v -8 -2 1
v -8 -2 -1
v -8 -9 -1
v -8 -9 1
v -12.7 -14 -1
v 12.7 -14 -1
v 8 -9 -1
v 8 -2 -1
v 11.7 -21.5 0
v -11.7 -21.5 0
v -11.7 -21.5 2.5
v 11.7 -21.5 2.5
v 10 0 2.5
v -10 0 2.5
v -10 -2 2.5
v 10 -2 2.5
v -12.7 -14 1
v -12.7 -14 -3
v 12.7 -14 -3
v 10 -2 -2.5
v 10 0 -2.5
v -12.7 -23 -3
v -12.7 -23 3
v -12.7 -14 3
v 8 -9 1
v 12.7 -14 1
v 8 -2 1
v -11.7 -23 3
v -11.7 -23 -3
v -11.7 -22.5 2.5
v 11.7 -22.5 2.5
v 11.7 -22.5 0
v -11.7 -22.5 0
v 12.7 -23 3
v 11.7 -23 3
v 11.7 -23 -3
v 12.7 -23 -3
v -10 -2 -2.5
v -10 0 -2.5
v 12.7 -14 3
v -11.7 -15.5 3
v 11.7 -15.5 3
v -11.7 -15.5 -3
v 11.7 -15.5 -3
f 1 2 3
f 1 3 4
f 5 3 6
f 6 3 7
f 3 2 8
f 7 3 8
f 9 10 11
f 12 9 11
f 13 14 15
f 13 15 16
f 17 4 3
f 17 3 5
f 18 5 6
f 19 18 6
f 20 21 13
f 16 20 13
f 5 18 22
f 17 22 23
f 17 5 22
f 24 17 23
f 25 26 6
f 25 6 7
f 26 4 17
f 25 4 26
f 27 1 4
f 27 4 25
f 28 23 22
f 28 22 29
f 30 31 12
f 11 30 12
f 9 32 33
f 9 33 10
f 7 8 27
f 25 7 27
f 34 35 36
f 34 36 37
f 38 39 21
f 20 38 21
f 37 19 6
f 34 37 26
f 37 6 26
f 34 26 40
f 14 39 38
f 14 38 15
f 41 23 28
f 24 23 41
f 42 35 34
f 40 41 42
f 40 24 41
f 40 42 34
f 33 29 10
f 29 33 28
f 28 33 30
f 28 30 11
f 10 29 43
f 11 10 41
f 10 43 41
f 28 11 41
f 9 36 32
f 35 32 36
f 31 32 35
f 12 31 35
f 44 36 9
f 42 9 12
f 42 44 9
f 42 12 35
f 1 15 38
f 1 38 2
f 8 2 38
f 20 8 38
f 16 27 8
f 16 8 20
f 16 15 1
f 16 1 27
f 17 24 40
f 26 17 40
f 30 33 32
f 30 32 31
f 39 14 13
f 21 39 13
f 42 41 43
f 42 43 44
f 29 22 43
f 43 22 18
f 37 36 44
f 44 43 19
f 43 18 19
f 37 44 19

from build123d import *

# Parameters (mm, degrees)
F0_W      = 20
F0_H      = 5
F1_DEPTH  = 2
F2_W      = 16
F2_H      = 2
F3_DEPTH  = 7
F5_DEPTH  = 2
F6_W      = 25.4
F6_H      = 6
F7_DEPTH  = 1.5
F8_W      = 1
F8_H      = 6
F9_DEPTH  = 7.5
F10_W     = 1
F10_H     = 2.5
F11_DEPTH = 23.4


with BuildPart() as f1:
    # F0 (on Front) → F1 (new body)
    with BuildSketch(Plane.XZ):
        Rectangle(F0_W, F0_H)
    extrude(amount=F1_DEPTH)

    # F2 (on face) → F3 (join)
    with BuildSketch(Plane.XZ.offset(2)):
        Rectangle(F2_W, F2_H)
    extrude(amount=F3_DEPTH)

    # F4 (on face) → F5 (join, through all)
    with BuildSketch(Plane.XY.offset(1)):
        Polygon((12.7, -14), (8, -9), (-8, -9), (-12.7, -14), align=None)
    extrude(amount=-F5_DEPTH)

    # F6 (on face) → F7 (join)
    with BuildSketch(Plane.XZ.offset(14)):
        Rectangle(F6_W, F6_H)
    extrude(amount=F7_DEPTH)

    # F8 (on face) → F9 (join)
    with BuildSketch(Plane.XZ.offset(15.5)):
        with Locations((-12.2, 0)):
            Rectangle(F8_W, F8_H)
        with Locations((12.2, 0)):
            Rectangle(F8_W, F8_H)
    extrude(amount=F9_DEPTH)

    # F10 (on face) → F11 (join, through all)
    with BuildSketch(Plane.YZ.offset(-11.7)):
        with Locations((-22, 1.25)):
            Rectangle(F10_W, F10_H)
    extrude(amount=F11_DEPTH)


solid = f1.part
